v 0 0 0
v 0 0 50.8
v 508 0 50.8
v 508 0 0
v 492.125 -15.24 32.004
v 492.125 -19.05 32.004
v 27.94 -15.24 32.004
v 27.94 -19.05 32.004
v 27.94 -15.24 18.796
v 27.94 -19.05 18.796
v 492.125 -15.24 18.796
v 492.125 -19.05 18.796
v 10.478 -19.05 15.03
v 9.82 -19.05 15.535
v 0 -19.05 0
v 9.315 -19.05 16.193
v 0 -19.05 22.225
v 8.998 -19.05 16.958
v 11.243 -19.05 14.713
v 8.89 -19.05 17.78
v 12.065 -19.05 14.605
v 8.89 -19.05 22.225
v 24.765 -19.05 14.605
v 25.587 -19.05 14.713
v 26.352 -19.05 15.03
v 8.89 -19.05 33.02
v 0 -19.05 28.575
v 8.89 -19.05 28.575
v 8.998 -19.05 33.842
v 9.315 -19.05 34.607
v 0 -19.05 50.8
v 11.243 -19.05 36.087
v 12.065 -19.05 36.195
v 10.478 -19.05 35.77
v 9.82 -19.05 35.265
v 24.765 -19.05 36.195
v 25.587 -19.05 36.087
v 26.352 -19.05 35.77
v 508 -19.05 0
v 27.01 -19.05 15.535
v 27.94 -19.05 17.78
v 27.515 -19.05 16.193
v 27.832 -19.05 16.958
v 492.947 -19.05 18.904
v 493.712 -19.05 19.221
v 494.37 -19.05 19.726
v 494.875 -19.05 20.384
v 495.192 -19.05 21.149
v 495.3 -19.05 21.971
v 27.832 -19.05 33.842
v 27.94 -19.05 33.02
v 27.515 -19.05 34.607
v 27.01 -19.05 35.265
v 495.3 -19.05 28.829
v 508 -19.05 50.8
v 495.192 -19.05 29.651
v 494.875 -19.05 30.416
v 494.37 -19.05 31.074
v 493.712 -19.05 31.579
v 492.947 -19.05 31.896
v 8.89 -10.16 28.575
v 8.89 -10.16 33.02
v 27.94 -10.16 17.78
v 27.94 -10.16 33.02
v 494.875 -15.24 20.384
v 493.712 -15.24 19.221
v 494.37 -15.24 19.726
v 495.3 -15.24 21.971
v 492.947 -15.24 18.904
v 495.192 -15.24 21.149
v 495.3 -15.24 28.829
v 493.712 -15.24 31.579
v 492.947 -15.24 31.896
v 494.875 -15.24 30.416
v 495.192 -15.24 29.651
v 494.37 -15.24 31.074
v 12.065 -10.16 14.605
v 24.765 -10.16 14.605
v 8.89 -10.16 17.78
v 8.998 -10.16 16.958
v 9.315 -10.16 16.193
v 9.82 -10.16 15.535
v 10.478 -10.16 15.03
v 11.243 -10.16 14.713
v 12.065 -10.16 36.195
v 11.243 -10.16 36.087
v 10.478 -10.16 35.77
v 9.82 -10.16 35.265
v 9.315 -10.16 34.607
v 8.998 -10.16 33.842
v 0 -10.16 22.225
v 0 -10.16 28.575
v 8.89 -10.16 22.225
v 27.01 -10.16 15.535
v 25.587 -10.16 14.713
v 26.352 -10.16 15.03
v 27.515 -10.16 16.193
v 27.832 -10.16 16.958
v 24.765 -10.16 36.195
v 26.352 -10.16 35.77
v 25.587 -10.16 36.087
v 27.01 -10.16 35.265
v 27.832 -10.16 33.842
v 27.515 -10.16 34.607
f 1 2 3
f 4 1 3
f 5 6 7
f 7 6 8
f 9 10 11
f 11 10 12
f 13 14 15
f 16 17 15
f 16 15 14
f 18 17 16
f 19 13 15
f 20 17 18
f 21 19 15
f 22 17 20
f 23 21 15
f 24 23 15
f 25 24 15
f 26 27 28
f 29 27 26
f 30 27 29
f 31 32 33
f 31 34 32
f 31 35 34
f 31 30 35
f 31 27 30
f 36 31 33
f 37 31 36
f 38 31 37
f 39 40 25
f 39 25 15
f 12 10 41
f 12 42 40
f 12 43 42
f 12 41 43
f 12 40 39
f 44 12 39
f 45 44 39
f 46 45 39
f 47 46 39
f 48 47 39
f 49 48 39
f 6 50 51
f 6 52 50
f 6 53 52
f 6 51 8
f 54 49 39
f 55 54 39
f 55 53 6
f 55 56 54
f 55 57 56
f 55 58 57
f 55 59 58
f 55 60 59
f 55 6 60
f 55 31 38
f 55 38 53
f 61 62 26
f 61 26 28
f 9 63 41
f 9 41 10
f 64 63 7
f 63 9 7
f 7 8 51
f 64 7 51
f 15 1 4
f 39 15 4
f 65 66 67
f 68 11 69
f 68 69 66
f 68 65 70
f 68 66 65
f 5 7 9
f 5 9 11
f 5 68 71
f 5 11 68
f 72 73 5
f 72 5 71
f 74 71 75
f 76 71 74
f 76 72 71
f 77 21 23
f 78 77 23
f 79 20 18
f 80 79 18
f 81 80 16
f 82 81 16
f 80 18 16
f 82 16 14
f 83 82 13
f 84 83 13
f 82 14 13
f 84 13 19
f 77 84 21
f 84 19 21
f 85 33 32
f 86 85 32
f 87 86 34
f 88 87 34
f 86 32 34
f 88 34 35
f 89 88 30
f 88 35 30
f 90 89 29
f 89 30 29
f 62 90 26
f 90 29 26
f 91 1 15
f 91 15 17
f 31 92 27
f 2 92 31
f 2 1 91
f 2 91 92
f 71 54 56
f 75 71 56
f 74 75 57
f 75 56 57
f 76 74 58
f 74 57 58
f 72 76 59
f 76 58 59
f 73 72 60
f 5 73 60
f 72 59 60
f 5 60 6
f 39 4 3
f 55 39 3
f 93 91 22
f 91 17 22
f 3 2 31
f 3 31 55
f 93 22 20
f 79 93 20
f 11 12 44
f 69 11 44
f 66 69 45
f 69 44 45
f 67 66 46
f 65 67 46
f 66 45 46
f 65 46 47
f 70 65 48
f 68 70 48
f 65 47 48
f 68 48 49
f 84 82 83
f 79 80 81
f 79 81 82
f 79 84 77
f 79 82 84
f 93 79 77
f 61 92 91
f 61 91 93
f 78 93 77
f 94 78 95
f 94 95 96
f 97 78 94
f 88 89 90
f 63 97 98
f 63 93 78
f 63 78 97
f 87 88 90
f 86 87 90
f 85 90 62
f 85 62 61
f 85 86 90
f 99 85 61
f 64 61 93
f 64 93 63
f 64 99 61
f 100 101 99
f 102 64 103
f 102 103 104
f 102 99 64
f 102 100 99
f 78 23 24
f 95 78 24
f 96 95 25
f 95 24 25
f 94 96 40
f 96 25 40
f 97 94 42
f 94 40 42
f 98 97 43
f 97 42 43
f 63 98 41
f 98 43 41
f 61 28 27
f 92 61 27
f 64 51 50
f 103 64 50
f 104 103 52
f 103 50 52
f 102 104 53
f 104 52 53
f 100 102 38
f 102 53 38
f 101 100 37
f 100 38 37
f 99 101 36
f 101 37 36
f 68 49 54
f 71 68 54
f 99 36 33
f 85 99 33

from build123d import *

# Parameters (mm, degrees)
F0_W     = 508
F0_H     = 50.8
F1_DEPTH = 19.05
F3_DEPTH = 3.81
F5_DEPTH = 8.89


with BuildPart() as f1:
    # F0 (on Front) → F1 (new body)
    with BuildSketch(Plane.XZ):
        with Locations((254, 25.4)):
            Rectangle(F0_W, F0_H)
    extrude(amount=F1_DEPTH)

    # F2 (on face) → F3 (cut)
    with BuildSketch(Plane.XZ.offset(19.05)):
        with BuildLine():
            Line((492.125, 32.004), (27.94, 32.004))
            Line((27.94, 32.004), (27.94, 33.02))
            ThreePointArc((27.94, 33.02), (27.010064, 35.265064), (24.765, 36.195))
            Line((24.765, 36.195), (12.065, 36.195))
            ThreePointArc((12.065, 36.195), (9.819936, 35.265064), (8.89, 33.02))
            Line((8.89, 33.02), (8.89, 28.575))
            Line((8.89, 28.575), (0, 28.575))
            Line((0, 28.575), (0, 22.225))
            Line((0, 22.225), (8.89, 22.225))
            Line((8.89, 22.225), (8.89, 17.78))
            ThreePointArc((8.89, 17.78), (9.819936, 15.534936), (12.065, 14.605))
            Line((12.065, 14.605), (24.765, 14.605))
            ThreePointArc((24.765, 14.605), (27.010064, 15.534936), (27.94, 17.78))
            Line((27.94, 17.78), (27.94, 18.796))
            Line((27.94, 18.796), (492.125, 18.796))
            ThreePointArc((492.125, 18.796), (494.370064, 19.725936), (495.3, 21.971))
            Line((495.3, 21.971), (495.3, 28.829))
            ThreePointArc((495.3, 28.829), (494.370064, 31.074064), (492.125, 32.004))
        make_face()
    extrude(amount=-F3_DEPTH, mode=Mode.SUBTRACT)

    # F4 (on face) → F5 (cut)
    with BuildSketch(Plane.XZ.offset(19.05)):
        with BuildLine():
            Line((12.065, 14.605), (24.765, 14.605))
            ThreePointArc((24.765, 14.605), (27.010064, 15.534936), (27.94, 17.78))
            Line((27.94, 17.78), (27.94, 33.02))
            ThreePointArc((27.94, 33.02), (27.010064, 35.265064), (24.765, 36.195))
            Line((24.765, 36.195), (12.065, 36.195))
            ThreePointArc((12.065, 36.195), (9.819936, 35.265064), (8.89, 33.02))
            Line((8.89, 33.02), (8.89, 28.575))
            Line((8.89, 28.575), (-2.839666, 28.575))
            ThreePointArc((-2.839666, 28.575), (-5.08473, 27.645064), (-6.014666, 25.4))
            ThreePointArc((-6.014666, 25.4), (-5.08473, 23.154936), (-2.839666, 22.225))
            Line((-2.839666, 22.225), (8.89, 22.225))
            Line((8.89, 22.225), (8.89, 17.78))
            ThreePointArc((8.89, 17.78), (9.819936, 15.534936), (12.065, 14.605))
        make_face()
    extrude(amount=-F5_DEPTH, mode=Mode.SUBTRACT)


solid = f1.part
